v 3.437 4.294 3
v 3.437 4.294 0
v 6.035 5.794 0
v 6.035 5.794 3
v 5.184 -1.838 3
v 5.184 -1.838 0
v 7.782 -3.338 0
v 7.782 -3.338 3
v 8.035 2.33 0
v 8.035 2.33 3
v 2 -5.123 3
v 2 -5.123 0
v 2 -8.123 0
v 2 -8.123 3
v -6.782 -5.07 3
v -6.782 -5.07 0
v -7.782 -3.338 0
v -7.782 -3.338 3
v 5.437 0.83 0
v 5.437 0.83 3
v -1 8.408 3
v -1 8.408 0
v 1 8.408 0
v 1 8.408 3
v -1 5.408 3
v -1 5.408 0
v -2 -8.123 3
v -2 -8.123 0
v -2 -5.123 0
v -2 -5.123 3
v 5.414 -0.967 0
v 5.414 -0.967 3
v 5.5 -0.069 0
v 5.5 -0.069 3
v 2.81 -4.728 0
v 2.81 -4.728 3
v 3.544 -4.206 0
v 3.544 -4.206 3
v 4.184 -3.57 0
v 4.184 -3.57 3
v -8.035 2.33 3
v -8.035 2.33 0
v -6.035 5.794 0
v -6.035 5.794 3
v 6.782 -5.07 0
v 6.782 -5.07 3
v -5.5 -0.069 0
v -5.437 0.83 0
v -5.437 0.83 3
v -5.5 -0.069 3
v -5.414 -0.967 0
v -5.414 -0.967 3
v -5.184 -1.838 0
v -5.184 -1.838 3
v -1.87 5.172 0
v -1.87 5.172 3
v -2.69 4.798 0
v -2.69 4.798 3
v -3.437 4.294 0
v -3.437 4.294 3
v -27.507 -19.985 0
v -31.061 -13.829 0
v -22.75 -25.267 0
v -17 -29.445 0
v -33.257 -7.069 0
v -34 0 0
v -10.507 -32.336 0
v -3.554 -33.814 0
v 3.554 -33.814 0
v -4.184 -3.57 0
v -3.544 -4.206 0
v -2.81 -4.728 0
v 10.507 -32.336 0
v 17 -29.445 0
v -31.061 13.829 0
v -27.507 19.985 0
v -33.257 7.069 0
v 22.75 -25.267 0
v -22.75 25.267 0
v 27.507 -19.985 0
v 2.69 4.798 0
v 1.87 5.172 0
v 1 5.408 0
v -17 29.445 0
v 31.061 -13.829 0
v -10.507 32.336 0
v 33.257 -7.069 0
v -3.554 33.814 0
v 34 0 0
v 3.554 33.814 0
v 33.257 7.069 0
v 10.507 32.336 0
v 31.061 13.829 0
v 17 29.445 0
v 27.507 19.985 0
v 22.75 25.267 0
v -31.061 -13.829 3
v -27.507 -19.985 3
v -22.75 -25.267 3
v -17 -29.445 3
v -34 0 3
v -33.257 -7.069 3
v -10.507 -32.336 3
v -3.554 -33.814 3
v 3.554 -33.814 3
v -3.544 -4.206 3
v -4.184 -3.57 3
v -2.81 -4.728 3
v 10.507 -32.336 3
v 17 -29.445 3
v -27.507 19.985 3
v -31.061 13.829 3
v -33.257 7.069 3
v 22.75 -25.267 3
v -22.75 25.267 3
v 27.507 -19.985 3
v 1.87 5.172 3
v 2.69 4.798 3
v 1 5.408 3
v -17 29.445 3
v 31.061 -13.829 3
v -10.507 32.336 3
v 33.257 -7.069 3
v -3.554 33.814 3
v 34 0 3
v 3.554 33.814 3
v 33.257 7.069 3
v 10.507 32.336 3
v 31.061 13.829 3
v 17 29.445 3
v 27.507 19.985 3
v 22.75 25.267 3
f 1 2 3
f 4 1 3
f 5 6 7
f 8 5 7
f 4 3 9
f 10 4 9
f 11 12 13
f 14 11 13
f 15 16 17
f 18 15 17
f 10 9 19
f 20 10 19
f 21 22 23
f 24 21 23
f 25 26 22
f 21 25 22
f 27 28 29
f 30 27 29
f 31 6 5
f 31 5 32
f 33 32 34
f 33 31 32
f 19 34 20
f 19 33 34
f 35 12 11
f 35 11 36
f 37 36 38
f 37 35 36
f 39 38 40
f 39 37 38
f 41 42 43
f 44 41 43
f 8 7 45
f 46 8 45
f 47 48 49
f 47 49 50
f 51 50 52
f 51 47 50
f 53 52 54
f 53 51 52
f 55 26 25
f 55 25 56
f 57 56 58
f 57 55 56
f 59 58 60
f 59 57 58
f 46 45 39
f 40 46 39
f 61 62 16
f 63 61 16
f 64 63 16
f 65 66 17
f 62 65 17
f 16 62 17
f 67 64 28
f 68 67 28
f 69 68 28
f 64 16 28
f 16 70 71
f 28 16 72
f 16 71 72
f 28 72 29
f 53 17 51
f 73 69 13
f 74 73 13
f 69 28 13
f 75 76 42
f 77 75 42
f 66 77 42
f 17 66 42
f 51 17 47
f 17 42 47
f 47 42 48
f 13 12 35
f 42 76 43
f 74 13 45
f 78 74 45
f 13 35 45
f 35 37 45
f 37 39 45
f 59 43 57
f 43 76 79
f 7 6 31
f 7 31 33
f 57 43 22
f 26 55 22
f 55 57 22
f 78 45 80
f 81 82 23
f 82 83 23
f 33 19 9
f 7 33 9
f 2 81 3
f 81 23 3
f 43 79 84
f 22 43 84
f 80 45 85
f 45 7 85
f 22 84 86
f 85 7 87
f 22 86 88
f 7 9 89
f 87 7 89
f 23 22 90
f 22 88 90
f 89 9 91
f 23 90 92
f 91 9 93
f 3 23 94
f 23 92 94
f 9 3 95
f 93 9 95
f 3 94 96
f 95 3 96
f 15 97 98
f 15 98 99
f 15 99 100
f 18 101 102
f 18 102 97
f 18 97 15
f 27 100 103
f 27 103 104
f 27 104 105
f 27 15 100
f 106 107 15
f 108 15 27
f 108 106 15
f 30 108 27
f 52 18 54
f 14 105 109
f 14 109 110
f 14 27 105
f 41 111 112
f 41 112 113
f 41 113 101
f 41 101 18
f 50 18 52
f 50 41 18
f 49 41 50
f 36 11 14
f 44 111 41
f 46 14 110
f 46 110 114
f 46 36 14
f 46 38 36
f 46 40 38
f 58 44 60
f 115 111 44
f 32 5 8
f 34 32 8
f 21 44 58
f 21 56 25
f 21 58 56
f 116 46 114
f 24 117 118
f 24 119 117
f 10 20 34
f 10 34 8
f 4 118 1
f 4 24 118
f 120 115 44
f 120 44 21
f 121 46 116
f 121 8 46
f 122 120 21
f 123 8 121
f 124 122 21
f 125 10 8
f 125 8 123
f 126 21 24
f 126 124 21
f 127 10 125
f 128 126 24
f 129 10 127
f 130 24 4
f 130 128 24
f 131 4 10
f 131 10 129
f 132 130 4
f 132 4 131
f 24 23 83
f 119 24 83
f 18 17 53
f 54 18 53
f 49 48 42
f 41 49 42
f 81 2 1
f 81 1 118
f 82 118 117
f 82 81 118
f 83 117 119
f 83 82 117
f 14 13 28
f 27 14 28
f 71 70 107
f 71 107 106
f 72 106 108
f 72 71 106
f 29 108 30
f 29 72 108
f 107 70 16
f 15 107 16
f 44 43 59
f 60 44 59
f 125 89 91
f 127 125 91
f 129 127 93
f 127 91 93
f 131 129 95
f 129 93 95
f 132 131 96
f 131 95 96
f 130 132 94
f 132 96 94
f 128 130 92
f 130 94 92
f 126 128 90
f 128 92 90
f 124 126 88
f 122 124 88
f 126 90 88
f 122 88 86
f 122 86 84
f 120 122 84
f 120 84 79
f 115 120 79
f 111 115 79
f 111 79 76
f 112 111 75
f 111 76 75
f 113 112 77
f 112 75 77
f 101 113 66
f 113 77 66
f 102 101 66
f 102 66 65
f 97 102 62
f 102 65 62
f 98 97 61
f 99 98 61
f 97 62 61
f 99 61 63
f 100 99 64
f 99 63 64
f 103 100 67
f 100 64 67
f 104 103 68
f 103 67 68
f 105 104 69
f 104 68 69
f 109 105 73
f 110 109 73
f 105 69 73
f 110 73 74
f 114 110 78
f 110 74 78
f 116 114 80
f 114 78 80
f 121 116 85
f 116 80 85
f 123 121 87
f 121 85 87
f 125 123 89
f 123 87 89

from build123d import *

# Parameters (mm, degrees)
SKETCH_R  = 34
PAD_DEPTH = 3


with BuildPart() as part:
    # Sketch → Pad (new body)
    with BuildSketch(Plane.XY):
        Circle(SKETCH_R)
        with BuildLine():
            ThreePointArc((3.43706, 4.293788), (2.287449, 5.001757), (1, 5.408327))
            Line((1, 8.408327), (1, 5.408327))
            Line((-1, 8.408327), (1, 8.408327))
            Line((-1, 5.408327), (-1, 8.408327))
            ThreePointArc((-1, 5.408327), (-2.287449, 5.001757), (-3.43706, 4.293788))
            Line((-6.035136, 5.793788), (-3.43706, 4.293788))
            Line((-8.035136, 2.329687), (-6.035136, 5.793788))
            Line((-5.43706, 0.829687), (-8.035136, 2.329687))
            ThreePointArc((-5.43706, 0.829687), (-5.475373, -0.51989), (-5.183748, -1.838138))
            Line((-7.781825, -3.338138), (-5.183748, -1.838138))
            Line((-6.781825, -5.070189), (-7.781825, -3.338138))
            Line((-4.183748, -3.570189), (-6.781825, -5.070189))
            ThreePointArc((-4.183748, -3.570189), (-3.187924, -4.481868), (-2, -5.123475))
            Line((-2, -8.123475), (-2, -5.123475))
            Line((2, -8.123475), (-2, -8.123475))
            Line((2, -5.123475), (2, -8.123475))
            ThreePointArc((2, -5.123475), (3.187924, -4.481868), (4.183748, -3.570189))
            Line((6.781825, -5.070189), (4.183748, -3.570189))
            Line((7.781825, -3.338138), (6.781825, -5.070189))
            Line((5.183748, -1.838138), (7.781825, -3.338138))
            ThreePointArc((5.183748, -1.838138), (5.475373, -0.51989), (5.43706, 0.829687))
            Line((8.035136, 2.329687), (5.43706, 0.829687))
            Line((6.035136, 5.793788), (8.035136, 2.329687))
            Line((3.43706, 4.293788), (6.035136, 5.793788))
        make_face(mode=Mode.SUBTRACT)
    extrude(amount=PAD_DEPTH)


solid = part.part
